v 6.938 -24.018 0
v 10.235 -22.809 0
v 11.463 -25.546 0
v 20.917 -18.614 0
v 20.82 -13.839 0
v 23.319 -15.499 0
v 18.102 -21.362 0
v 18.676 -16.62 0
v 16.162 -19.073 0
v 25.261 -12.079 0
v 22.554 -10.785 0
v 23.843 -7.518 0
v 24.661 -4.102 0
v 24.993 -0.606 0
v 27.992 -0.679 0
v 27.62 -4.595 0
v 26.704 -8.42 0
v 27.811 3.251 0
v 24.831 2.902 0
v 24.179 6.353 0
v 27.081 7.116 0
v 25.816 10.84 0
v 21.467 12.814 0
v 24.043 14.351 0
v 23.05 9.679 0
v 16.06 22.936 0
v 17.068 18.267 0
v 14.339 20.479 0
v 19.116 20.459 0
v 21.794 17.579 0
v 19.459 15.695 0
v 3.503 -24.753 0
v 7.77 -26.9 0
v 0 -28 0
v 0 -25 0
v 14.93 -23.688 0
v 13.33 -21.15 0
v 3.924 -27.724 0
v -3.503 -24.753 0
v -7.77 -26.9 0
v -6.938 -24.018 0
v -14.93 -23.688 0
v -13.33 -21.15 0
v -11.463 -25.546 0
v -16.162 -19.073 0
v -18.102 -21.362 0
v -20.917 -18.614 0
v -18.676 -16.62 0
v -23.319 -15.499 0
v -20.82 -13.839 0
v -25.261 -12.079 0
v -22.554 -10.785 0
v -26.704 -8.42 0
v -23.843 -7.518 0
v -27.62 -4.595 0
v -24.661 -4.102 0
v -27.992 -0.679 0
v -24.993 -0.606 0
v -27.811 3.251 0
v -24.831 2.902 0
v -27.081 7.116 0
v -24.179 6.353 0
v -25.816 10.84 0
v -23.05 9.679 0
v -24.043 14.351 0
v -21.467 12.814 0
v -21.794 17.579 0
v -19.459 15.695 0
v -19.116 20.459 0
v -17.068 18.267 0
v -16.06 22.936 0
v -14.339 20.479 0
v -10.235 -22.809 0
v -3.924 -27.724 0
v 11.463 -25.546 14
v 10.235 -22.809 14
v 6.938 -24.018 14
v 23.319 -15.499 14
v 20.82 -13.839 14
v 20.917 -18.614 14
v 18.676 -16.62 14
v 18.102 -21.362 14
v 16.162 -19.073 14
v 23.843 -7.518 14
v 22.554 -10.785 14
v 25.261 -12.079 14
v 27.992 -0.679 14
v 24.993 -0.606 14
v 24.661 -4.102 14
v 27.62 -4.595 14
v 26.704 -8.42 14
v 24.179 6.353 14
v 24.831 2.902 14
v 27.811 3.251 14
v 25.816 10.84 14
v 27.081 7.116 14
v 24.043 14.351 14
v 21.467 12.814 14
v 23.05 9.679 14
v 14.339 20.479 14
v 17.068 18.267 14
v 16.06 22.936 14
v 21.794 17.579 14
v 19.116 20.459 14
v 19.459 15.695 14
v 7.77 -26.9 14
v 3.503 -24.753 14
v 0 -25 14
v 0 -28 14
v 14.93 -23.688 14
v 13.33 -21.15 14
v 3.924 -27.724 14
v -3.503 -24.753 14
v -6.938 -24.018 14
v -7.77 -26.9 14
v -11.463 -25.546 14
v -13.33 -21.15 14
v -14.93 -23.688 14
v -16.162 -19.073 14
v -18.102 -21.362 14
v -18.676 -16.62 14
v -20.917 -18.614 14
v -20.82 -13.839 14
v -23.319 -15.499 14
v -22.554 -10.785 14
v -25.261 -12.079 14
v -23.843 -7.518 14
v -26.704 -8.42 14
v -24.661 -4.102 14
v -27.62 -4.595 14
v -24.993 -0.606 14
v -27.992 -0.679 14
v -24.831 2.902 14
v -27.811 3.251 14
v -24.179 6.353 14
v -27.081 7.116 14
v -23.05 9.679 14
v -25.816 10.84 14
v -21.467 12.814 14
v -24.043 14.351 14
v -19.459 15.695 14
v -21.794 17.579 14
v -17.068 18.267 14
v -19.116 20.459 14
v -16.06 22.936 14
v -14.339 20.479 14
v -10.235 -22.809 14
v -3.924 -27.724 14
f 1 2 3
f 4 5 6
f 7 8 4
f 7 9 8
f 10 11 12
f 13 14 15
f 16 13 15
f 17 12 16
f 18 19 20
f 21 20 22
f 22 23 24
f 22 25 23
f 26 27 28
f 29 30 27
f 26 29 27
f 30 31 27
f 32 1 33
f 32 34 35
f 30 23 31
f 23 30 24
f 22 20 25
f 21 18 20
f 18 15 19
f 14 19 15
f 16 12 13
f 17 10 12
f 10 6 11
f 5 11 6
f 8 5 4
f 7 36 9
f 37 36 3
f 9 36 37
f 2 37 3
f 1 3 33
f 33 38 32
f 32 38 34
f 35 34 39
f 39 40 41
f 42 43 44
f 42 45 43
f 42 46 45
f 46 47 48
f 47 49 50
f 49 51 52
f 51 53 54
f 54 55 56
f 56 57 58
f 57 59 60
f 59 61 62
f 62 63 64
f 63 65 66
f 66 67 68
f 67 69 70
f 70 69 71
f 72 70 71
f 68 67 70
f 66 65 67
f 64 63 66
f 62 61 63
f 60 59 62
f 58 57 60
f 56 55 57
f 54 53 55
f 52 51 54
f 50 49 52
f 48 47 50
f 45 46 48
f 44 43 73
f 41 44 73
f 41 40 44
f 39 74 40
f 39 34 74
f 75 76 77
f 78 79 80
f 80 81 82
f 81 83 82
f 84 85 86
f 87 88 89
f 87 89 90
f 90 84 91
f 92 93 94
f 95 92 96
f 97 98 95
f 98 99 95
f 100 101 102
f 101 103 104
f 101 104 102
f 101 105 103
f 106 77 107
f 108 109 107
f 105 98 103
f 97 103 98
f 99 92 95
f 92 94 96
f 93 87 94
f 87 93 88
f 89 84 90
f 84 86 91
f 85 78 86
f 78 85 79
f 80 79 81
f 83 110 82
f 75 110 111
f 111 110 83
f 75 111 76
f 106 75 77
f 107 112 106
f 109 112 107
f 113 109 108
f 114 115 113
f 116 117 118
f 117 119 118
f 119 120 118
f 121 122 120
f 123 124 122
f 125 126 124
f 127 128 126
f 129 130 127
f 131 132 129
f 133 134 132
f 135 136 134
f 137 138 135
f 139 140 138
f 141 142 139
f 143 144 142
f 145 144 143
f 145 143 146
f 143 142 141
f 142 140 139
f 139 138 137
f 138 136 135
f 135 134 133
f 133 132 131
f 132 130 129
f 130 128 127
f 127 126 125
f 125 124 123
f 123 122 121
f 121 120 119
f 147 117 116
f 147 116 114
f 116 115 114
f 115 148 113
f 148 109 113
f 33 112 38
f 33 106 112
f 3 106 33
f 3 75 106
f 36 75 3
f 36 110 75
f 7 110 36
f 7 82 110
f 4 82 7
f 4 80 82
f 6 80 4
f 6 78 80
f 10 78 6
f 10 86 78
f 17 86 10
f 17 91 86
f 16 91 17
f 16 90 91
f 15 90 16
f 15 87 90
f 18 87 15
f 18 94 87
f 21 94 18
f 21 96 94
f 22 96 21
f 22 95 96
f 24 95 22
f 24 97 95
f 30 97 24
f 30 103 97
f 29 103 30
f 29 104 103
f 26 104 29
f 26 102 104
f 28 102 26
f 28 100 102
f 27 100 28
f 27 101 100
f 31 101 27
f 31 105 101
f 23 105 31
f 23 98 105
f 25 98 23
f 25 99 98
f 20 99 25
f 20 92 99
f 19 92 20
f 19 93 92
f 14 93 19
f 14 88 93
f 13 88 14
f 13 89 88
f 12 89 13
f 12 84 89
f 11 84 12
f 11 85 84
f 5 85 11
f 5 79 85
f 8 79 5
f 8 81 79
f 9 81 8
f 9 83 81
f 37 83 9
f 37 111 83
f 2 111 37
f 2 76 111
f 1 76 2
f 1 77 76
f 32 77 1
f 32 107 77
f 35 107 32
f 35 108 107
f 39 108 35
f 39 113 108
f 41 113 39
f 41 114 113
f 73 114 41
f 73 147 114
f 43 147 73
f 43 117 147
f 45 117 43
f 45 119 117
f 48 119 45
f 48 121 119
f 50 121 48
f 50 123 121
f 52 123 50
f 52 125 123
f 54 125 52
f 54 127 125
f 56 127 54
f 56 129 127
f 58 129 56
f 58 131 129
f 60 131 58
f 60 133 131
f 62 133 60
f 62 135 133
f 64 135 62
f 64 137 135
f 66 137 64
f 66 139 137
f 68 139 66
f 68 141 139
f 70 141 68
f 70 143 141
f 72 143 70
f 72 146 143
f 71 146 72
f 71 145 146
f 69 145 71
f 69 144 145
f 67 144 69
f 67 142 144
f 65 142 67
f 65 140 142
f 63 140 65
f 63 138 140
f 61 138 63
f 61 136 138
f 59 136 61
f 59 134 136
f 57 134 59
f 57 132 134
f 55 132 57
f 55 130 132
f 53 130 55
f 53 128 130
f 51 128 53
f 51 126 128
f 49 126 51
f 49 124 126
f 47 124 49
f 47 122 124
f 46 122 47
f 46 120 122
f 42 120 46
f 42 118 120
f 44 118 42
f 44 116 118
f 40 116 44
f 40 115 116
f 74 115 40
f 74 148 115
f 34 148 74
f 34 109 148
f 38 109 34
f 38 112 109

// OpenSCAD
$fn = 32;

// ----------------------------------------------------------------------
// Spring clip: 56 mm outside, 3 mm band, 70 degree opening
// ----------------------------------------------------------------------

// --- parameters (mm) ---
outer_r = 28;             // clip outside radius
inner_r = 25;             // clip bore radius
band = 3;                 // band thickness
clip_w = 14;              // clip width
opening = 70;             // opening angle

clip_profile = [[-16.06, 22.936], [-19.116, 20.459], [-21.794, 17.579], [-24.043, 14.351], [-25.816, 10.84], [-27.081, 7.116], [-27.811, 3.251], [-27.992, -0.679], [-27.62, -4.595], [-26.704, -8.42], [-25.261, -12.079], [-23.319, -15.499], [-20.917, -18.614], [-18.102, -21.362], [-14.93, -23.688], [-11.463, -25.546], [-7.77, -26.9], [-3.924, -27.724], [0, -28], [3.924, -27.724], [7.77, -26.9], [11.463, -25.546], [14.93, -23.688], [18.102, -21.362], [20.917, -18.614], [23.319, -15.499], [25.261, -12.079], [26.704, -8.42], [27.62, -4.595], [27.992, -0.679], [27.811, 3.251], [27.081, 7.116], [25.816, 10.84], [24.043, 14.351], [21.794, 17.579], [19.116, 20.459], [16.06, 22.936], [14.339, 20.479], [17.068, 18.267], [19.459, 15.695], [21.467, 12.814], [23.05, 9.679], [24.179, 6.353], [24.831, 2.902], [24.993, -0.606], [24.661, -4.102], [23.843, -7.518], [22.554, -10.785], [20.82, -13.839], [18.676, -16.62], [16.162, -19.073], [13.33, -21.15], [10.235, -22.809], [6.938, -24.018], [3.503, -24.753], [0, -25], [-3.503, -24.753], [-6.938, -24.018], [-10.235, -22.809], [-13.33, -21.15], [-16.162, -19.073], [-18.676, -16.62], [-20.82, -13.839], [-22.554, -10.785], [-23.843, -7.518], [-24.661, -4.102], [-24.993, -0.606], [-24.831, 2.902], [-24.179, 6.353], [-23.05, 9.679], [-21.467, 12.814], [-19.459, 15.695], [-17.068, 18.267], [-14.339, 20.479]];

difference() {
  union() {
    linear_extrude(height = clip_w) polygon(clip_profile);
  }
}
